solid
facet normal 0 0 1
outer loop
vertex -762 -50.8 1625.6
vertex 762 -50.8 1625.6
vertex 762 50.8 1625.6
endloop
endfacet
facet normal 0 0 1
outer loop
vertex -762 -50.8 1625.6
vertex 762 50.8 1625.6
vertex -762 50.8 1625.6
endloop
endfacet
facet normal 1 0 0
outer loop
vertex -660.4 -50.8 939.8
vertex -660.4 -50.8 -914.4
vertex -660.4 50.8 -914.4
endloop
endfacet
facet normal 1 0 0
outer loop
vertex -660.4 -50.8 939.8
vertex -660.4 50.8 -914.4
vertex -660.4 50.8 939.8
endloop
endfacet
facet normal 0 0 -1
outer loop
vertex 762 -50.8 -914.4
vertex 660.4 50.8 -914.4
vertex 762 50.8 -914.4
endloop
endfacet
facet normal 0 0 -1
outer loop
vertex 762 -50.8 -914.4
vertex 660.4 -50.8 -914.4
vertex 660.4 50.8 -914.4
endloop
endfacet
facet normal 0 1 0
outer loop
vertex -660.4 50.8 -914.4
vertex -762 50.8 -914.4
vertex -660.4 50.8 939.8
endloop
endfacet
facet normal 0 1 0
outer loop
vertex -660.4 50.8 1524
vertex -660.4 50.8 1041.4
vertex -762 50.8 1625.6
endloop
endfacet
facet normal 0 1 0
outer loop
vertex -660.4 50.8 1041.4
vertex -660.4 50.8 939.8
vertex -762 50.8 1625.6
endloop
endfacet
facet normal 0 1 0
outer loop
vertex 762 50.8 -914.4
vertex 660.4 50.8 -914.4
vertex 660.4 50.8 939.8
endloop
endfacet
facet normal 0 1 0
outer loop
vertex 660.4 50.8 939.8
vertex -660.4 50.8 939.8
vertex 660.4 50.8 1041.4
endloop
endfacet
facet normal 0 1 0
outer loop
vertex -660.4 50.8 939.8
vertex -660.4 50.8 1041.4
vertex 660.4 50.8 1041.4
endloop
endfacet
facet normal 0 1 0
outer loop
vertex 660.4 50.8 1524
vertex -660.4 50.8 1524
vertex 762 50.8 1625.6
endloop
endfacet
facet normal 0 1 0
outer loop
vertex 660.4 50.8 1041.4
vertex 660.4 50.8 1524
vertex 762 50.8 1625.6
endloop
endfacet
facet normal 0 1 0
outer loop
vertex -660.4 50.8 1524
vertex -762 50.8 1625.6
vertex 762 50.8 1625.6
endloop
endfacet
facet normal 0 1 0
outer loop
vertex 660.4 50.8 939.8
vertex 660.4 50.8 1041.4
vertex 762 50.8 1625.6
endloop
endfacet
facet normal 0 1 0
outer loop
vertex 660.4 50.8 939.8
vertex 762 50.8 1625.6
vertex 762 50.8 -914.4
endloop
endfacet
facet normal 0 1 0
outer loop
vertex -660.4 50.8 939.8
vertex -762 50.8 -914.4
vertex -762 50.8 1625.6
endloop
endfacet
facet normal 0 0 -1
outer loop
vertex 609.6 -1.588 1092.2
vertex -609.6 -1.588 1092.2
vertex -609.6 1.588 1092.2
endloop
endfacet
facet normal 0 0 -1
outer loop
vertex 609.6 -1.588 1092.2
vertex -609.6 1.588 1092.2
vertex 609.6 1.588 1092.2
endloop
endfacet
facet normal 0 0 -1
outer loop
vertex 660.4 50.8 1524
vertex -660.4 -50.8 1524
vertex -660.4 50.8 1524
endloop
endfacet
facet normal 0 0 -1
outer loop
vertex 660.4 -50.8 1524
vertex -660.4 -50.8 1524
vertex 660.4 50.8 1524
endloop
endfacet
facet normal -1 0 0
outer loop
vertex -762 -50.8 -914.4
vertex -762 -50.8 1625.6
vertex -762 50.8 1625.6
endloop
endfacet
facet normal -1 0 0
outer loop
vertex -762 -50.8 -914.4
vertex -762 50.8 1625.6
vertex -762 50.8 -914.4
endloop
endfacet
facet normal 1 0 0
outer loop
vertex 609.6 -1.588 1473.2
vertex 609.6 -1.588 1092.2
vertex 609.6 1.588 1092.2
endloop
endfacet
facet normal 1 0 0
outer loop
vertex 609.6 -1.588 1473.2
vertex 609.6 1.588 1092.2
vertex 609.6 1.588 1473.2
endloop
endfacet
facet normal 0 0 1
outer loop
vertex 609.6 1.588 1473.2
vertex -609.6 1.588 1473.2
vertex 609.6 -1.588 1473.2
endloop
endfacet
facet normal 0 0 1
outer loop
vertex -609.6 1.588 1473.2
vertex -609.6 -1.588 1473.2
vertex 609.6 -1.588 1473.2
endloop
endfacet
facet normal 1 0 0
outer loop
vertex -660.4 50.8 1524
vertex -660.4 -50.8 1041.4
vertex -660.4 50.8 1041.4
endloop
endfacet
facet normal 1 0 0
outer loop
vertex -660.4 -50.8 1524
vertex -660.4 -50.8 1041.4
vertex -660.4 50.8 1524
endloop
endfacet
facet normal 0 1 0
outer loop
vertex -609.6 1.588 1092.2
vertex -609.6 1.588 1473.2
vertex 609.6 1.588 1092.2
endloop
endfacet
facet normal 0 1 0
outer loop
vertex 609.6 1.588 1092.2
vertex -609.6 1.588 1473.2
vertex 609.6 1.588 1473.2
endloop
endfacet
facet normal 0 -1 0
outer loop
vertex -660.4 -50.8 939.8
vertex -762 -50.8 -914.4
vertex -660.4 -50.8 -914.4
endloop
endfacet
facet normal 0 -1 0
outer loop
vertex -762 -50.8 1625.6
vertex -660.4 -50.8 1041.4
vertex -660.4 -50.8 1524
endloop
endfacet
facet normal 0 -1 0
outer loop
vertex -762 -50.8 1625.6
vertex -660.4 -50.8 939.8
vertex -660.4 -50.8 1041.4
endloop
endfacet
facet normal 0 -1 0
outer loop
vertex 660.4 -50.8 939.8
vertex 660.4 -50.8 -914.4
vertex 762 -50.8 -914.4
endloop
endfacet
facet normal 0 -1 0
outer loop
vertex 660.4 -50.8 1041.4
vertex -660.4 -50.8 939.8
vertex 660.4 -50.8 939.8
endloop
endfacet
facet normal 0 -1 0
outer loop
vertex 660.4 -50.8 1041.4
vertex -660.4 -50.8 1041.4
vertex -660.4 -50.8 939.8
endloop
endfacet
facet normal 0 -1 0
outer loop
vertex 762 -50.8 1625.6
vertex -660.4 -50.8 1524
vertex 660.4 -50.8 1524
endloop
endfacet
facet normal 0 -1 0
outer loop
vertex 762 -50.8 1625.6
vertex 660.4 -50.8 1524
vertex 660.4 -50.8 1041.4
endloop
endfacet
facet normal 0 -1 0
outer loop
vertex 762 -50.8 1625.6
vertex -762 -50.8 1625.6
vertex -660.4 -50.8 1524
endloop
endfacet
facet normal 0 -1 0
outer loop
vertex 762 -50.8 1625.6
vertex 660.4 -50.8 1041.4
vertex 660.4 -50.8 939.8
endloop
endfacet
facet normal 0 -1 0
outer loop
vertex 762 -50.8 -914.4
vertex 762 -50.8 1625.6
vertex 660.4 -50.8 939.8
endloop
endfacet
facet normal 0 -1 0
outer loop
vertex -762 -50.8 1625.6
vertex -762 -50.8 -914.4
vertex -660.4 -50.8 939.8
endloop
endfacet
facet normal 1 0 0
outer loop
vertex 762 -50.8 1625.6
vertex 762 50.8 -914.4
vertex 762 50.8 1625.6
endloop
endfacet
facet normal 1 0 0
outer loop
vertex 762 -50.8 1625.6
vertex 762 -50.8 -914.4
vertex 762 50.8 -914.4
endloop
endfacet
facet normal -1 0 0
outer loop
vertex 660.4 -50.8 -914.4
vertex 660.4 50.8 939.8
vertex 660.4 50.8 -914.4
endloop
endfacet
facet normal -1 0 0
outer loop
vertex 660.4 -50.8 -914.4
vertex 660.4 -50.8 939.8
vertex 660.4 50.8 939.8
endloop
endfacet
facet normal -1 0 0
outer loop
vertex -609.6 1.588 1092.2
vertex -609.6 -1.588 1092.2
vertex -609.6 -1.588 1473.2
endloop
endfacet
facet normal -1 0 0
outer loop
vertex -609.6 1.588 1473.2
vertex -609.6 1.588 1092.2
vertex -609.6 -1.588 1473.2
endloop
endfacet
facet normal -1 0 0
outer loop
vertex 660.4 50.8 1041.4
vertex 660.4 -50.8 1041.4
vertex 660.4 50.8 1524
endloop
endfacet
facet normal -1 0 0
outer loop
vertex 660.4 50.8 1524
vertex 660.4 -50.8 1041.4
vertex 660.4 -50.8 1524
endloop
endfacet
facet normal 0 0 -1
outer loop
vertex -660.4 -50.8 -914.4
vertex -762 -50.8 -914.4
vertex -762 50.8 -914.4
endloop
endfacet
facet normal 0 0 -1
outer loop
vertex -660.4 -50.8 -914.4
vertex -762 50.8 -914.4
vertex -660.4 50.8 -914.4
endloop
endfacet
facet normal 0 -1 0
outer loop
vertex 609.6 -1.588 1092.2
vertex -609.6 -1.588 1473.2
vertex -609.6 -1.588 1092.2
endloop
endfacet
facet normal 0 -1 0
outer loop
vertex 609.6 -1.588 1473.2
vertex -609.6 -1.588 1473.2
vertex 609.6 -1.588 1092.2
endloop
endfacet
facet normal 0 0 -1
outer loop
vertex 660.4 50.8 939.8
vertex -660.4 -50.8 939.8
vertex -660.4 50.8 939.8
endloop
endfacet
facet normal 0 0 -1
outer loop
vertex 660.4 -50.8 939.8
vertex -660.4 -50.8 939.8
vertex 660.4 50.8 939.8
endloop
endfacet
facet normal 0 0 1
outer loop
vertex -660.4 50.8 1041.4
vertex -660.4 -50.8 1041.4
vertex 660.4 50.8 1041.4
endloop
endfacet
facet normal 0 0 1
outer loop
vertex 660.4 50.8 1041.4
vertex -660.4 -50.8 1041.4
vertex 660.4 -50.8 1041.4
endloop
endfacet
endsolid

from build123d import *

# Parameters (mm, degrees)
F0_W     = 1320.8
F0_H     = 482.6
F1_DEPTH = 50.8
F2_W     = 1219.2
F2_H     = 381
F3_DEPTH = 1.5875


with BuildPart() as f1:
    # F0 (on Front) → F1 (new body, symmetric)
    with BuildSketch(Plane.XZ):
        Polygon((762, -914.4), (762, 1625.6), (-762, 1625.6), (-762, -914.4), (-660.4, -914.4), (-660.4, 939.8), (660.4, 939.8), (660.4, -914.4), align=None)
        with Locations((0, 1282.7)):
            Rectangle(F0_W, F0_H, mode=Mode.SUBTRACT)
    extrude(amount=F1_DEPTH, both=True)


with BuildPart() as f3:
    # F2 (on Front) → F3 (new body, symmetric)
    with BuildSketch(Plane.XZ):
        with Locations((0, 1282.7)):
            Rectangle(F2_W, F2_H)
    extrude(amount=F3_DEPTH, both=True)


solid = Compound([f1.part, f3.part])
